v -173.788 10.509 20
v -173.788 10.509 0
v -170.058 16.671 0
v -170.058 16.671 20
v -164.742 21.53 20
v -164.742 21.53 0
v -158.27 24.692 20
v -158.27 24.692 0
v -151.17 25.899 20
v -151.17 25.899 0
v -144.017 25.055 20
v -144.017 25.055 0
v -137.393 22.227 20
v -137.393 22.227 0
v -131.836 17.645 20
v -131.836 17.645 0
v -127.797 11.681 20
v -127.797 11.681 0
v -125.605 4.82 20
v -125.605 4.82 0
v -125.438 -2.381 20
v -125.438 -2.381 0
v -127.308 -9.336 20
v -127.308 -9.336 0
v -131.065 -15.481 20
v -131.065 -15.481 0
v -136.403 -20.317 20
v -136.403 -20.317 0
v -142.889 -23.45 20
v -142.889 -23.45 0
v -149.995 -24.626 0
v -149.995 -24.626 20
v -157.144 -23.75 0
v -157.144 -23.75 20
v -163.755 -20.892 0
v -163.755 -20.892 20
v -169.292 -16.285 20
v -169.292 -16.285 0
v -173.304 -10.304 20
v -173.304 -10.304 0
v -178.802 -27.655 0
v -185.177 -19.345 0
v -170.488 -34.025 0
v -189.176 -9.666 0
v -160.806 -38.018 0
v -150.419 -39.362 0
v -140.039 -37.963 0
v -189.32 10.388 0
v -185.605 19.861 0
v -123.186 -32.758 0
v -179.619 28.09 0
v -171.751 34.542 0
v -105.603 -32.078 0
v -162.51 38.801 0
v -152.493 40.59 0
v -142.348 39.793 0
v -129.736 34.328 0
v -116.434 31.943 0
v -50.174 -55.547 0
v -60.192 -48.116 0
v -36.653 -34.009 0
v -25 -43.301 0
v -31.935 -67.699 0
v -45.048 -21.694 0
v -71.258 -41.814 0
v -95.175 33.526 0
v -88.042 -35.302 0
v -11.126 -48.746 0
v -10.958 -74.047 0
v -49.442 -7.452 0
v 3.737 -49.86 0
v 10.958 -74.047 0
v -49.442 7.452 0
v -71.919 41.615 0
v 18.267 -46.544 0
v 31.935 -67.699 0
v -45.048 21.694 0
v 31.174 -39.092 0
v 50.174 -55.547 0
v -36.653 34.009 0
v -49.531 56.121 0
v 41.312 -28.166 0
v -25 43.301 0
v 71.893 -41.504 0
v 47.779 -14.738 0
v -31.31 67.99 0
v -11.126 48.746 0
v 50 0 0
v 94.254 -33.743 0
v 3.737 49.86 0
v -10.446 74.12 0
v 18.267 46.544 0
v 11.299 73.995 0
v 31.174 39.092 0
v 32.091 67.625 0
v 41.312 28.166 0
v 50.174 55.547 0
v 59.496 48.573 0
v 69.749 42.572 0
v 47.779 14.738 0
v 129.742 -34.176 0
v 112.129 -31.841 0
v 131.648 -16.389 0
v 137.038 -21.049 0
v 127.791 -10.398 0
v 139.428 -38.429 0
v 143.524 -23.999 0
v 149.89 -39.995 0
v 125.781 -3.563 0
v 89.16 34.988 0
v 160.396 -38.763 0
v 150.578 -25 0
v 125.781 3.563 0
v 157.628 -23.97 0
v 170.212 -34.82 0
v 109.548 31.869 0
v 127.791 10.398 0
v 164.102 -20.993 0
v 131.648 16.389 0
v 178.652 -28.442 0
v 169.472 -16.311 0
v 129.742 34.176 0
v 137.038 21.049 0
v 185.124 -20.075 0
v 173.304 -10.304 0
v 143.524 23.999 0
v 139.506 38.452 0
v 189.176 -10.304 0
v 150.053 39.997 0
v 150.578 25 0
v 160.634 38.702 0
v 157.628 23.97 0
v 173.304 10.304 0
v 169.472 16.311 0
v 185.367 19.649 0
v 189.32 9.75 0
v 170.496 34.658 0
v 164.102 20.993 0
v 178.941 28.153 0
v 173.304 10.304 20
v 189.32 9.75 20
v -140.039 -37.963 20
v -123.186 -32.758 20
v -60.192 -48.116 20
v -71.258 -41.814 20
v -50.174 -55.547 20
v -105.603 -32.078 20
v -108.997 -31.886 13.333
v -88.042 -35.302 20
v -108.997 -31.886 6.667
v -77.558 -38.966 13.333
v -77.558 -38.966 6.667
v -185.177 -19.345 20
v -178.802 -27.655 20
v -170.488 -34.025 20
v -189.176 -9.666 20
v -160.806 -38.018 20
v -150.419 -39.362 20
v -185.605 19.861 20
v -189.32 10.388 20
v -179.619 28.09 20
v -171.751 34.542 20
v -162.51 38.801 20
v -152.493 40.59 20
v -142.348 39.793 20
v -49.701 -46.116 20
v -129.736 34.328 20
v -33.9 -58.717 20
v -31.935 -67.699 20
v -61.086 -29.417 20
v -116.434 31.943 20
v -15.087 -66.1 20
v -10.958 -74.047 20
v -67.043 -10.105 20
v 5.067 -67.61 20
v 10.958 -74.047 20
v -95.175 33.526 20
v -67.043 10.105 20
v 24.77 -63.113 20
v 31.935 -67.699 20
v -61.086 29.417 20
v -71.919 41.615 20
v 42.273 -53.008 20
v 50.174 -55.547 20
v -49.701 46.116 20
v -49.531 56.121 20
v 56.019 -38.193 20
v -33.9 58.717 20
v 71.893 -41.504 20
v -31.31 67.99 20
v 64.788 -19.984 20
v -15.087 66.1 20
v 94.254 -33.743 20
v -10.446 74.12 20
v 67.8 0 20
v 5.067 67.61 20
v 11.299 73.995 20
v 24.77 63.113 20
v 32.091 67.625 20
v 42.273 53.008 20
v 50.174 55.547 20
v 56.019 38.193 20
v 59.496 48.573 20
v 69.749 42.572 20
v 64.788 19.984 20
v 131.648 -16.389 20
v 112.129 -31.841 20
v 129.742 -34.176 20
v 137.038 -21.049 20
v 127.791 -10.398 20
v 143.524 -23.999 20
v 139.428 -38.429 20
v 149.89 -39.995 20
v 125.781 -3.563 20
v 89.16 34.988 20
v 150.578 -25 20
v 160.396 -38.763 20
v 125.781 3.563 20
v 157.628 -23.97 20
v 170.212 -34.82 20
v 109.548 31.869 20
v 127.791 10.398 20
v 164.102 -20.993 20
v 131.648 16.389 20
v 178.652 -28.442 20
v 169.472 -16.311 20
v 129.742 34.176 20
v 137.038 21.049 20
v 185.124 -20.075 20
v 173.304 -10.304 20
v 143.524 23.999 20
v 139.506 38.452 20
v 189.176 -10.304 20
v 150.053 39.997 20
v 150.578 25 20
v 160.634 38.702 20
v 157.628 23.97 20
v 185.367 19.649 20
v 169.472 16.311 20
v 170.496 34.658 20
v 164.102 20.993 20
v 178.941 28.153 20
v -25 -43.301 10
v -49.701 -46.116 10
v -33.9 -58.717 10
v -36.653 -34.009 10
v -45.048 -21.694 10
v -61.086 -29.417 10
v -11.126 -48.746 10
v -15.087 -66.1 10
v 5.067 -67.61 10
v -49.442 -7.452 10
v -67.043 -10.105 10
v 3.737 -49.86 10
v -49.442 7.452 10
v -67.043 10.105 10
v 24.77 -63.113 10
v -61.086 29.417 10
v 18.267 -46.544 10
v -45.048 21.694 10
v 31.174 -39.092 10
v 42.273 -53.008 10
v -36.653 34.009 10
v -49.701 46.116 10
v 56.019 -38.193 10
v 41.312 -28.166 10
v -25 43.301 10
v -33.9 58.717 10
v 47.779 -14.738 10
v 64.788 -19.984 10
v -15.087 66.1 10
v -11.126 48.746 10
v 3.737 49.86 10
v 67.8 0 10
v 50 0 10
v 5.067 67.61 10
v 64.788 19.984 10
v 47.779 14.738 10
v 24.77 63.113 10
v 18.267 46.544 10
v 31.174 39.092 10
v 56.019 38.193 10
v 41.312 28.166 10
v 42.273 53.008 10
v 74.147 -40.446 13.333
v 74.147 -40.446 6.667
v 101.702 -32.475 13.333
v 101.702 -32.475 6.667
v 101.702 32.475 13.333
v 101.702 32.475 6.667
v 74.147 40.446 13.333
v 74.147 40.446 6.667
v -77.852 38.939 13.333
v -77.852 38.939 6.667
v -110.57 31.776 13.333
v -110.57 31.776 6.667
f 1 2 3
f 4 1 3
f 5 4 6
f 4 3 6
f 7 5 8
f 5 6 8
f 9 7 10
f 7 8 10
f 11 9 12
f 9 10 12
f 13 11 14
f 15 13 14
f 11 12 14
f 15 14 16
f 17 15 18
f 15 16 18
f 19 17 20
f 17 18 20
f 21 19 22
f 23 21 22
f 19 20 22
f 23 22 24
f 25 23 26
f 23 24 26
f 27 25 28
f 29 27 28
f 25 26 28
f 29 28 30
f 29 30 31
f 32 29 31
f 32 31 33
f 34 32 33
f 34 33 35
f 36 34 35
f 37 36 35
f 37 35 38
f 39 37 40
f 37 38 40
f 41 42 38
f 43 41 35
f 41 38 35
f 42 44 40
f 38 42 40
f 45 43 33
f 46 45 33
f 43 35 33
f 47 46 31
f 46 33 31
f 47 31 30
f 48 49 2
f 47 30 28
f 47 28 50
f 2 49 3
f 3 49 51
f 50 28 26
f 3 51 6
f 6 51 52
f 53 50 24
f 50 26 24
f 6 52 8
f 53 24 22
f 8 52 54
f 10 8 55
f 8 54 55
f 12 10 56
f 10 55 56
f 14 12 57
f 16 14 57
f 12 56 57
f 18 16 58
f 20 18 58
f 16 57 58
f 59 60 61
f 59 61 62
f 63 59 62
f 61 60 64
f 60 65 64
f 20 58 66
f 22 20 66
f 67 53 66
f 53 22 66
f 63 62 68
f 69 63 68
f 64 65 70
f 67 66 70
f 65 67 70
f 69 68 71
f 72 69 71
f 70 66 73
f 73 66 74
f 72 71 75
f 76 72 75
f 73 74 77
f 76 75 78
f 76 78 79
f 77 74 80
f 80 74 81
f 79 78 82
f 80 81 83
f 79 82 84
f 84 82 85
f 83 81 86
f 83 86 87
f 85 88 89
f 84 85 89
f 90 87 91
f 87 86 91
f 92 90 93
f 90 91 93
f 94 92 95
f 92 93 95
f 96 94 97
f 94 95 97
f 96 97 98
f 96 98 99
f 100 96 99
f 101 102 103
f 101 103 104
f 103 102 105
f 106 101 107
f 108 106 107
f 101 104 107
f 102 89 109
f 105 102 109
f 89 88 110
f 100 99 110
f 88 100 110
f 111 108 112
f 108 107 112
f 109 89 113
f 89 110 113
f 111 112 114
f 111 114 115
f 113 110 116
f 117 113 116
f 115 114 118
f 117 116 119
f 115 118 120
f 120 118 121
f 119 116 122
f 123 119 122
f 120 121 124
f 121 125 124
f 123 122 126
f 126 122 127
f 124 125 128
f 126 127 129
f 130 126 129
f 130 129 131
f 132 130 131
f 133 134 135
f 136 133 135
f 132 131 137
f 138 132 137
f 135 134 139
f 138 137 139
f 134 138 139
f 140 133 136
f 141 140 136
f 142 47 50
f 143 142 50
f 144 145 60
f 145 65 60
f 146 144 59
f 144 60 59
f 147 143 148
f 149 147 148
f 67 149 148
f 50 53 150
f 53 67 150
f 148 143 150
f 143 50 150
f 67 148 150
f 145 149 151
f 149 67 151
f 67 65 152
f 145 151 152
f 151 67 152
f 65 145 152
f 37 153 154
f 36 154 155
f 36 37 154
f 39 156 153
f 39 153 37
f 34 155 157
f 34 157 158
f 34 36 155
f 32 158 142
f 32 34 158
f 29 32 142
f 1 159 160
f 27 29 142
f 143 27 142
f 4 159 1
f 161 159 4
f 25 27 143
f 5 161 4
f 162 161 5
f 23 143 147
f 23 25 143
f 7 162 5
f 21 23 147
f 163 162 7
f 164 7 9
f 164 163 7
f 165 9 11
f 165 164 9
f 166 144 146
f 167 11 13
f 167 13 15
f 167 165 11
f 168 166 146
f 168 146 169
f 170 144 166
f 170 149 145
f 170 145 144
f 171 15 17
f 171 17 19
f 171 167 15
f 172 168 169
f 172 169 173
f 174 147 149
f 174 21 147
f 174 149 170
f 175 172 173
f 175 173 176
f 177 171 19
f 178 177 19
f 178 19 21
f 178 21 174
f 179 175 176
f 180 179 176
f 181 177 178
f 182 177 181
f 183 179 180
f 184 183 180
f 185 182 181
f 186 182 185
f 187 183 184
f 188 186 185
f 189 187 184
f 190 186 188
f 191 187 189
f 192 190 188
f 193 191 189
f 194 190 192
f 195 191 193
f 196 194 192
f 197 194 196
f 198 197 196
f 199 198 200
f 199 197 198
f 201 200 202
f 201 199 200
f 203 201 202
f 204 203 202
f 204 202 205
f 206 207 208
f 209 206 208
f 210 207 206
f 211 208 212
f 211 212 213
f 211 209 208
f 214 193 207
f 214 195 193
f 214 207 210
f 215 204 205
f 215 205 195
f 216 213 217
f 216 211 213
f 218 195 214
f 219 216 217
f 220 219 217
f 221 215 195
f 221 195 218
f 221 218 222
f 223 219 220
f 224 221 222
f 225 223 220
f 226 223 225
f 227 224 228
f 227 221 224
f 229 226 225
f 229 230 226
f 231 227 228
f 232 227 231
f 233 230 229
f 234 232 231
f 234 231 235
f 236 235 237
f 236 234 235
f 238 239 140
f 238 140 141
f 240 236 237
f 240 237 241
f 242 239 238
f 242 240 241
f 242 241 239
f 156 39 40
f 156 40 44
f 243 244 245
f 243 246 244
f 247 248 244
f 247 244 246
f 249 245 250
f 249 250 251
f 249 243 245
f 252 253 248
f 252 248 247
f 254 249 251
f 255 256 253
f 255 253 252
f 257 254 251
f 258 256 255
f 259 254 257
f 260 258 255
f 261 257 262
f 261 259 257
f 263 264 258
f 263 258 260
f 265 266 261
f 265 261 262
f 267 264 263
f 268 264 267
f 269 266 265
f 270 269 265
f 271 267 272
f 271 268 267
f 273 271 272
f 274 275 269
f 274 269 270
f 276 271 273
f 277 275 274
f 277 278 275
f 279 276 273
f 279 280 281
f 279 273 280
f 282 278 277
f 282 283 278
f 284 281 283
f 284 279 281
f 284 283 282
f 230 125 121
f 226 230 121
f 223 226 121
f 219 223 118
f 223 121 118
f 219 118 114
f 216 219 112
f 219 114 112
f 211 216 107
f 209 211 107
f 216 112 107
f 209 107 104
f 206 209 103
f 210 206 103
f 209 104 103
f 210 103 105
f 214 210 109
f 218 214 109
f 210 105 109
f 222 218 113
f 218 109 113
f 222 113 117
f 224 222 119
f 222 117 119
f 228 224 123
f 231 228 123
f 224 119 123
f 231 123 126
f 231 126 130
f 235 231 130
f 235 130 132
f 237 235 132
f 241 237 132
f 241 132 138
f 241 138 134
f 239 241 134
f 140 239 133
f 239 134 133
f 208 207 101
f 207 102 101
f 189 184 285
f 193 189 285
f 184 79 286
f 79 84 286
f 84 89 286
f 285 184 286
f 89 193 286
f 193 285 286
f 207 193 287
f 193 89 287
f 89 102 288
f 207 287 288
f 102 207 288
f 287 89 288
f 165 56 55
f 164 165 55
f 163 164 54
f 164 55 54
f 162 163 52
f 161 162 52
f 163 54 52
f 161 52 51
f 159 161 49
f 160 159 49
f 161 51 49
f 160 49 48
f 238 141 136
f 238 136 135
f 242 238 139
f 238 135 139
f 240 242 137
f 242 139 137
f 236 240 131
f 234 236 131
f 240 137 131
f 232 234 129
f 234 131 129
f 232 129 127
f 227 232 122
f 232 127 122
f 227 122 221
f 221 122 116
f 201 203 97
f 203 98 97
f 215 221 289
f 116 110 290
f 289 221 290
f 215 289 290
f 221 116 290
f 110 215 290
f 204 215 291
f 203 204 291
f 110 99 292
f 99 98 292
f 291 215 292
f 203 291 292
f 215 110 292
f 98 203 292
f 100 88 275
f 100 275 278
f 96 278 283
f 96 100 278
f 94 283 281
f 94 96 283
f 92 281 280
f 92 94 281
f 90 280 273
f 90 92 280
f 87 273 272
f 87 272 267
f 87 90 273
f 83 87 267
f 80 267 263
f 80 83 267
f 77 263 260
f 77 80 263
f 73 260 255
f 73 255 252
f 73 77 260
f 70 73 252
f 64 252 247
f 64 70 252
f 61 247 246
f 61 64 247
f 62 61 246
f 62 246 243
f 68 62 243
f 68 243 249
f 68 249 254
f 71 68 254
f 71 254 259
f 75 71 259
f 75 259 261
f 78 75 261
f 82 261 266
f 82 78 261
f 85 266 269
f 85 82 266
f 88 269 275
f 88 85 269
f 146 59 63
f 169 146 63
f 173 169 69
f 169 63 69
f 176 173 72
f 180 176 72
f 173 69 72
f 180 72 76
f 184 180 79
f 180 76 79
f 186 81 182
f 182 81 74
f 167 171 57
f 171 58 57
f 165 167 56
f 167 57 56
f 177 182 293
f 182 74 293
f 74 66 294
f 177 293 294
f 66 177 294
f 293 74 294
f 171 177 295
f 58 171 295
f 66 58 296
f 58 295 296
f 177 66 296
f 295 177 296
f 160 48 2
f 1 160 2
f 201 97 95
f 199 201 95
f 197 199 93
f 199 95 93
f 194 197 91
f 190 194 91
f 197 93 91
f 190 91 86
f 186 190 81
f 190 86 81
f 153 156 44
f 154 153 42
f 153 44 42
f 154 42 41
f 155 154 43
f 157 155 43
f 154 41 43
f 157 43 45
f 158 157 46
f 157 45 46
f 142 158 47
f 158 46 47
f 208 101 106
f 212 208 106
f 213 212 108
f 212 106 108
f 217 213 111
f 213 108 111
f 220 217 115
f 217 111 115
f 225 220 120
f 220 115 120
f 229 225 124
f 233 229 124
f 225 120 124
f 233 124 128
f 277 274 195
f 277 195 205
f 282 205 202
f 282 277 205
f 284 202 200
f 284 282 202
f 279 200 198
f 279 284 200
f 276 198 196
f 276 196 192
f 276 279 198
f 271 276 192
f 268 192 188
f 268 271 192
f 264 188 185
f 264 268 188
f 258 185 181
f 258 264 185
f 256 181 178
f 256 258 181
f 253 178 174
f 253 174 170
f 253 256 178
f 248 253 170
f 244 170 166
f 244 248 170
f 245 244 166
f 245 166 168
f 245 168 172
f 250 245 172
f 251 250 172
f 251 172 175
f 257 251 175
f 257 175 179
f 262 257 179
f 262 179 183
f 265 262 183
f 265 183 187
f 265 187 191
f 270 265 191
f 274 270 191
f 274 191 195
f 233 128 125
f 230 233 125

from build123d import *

# Parameters (mm, degrees)
SKETCH1_R            = 67.8
BOSS_EXTRUDE11_DEPTH = 20
SKETCH1_14_R         = 67.8
SKETCH1_14_R_2       = 50
BOSS_EXTRUDE12_DEPTH = 10


with BuildPart() as part:
    # Sketch1 → Boss-Extrude11 (new body)
    with BuildSketch(Plane.XY):
        with BuildLine():
            ThreePointArc((-142.34841847, 39.793144177), (-171.751198945, 34.54231297), (-189.319803444, 10.387833799))
            Line((-189.319803444, 10.387833799), (-173.788179779, 10.509033195))
            ThreePointArc((-173.788179779, 10.509033195), (-125.263414989, 1.225516677), (-173.304176626, -10.303650604))
            Line((-173.304176626, -10.303650604), (-189.176390414, -9.665625813))
            ThreePointArc((-189.176390414, -9.665625813), (-170.488139493, -34.024955882), (-140.039484135, -37.962857708))
            add(Edge.make_bspline(
                [(-140.039484135, -37.962857708), (-110.680407711, -24.08950974), (-74.045313114, -35.434332747), (-50.174260477, -55.547410213)],
                knots=[0.026307931, 0.026307931, 0.026307931, 0.026307931, 0.97051711, 0.97051711, 0.97051711, 0.97051711], degree=3))
            ThreePointArc((-50.174260477, -55.547410213), (0, -74.85299724), (50.174260477, -55.547410213))
            add(Edge.make_bspline(
                [(129.742096758, -34.176303824), (102.491508086, -26.790776239), (71.323341509, -37.727789453), (50.174260477, -55.547410213)],
                knots=[0.133974342, 0.133974342, 0.133974342, 0.133974342, 0.97051711, 0.97051711, 0.97051711, 0.97051711], degree=3))
            ThreePointArc((129.742096758, -34.176303824), (165.435107978, -37.117723558), (189.176390414, -10.303650604))
            Line((189.176390414, -10.303650604), (173.304176626, -10.303650604))
            ThreePointArc((173.304176626, -10.303650604), (125.526231498, 0), (173.304176626, 10.303650604))
            Line((173.304176626, 10.303650604), (189.319803444, 9.749809007))
            ThreePointArc((189.319803444, 9.749809007), (165.700168673, 37.010155777), (129.742096758, 34.176303824))
            add(Edge.make_bspline(
                [(129.742096758, 34.176303824), (102.491508086, 26.790776239), (71.323341509, 37.727789453), (50.174260477, 55.547410213)],
                knots=[0.133974342, 0.133974342, 0.133974342, 0.133974342, 0.97051711, 0.97051711, 0.97051711, 0.97051711], degree=3))
            ThreePointArc((50.174260477, 55.547410213), (0.430867535, 74.851757154), (-49.531464066, 56.121344098))
            add(Edge.make_bspline(
                [(-49.531464066, 56.121344098), (-73.874099433, 35.650364126), (-112.8184932, 22.464713449), (-142.34841847, 39.793144177)],
                knots=[0.14825783, 0.14825783, 0.14825783, 0.14825783, 1.127132671, 1.127132671, 1.127132671, 1.127132671], degree=3))
        make_face()
        Circle(SKETCH1_R, mode=Mode.SUBTRACT)
    extrude(amount=BOSS_EXTRUDE11_DEPTH)

    # Sketch1<14> → Boss-Extrude12 (add)
    with BuildSketch(Plane.XY):
        Circle(SKETCH1_14_R)
        Circle(SKETCH1_14_R_2, mode=Mode.SUBTRACT)
    extrude(amount=BOSS_EXTRUDE12_DEPTH)


solid = part.part
